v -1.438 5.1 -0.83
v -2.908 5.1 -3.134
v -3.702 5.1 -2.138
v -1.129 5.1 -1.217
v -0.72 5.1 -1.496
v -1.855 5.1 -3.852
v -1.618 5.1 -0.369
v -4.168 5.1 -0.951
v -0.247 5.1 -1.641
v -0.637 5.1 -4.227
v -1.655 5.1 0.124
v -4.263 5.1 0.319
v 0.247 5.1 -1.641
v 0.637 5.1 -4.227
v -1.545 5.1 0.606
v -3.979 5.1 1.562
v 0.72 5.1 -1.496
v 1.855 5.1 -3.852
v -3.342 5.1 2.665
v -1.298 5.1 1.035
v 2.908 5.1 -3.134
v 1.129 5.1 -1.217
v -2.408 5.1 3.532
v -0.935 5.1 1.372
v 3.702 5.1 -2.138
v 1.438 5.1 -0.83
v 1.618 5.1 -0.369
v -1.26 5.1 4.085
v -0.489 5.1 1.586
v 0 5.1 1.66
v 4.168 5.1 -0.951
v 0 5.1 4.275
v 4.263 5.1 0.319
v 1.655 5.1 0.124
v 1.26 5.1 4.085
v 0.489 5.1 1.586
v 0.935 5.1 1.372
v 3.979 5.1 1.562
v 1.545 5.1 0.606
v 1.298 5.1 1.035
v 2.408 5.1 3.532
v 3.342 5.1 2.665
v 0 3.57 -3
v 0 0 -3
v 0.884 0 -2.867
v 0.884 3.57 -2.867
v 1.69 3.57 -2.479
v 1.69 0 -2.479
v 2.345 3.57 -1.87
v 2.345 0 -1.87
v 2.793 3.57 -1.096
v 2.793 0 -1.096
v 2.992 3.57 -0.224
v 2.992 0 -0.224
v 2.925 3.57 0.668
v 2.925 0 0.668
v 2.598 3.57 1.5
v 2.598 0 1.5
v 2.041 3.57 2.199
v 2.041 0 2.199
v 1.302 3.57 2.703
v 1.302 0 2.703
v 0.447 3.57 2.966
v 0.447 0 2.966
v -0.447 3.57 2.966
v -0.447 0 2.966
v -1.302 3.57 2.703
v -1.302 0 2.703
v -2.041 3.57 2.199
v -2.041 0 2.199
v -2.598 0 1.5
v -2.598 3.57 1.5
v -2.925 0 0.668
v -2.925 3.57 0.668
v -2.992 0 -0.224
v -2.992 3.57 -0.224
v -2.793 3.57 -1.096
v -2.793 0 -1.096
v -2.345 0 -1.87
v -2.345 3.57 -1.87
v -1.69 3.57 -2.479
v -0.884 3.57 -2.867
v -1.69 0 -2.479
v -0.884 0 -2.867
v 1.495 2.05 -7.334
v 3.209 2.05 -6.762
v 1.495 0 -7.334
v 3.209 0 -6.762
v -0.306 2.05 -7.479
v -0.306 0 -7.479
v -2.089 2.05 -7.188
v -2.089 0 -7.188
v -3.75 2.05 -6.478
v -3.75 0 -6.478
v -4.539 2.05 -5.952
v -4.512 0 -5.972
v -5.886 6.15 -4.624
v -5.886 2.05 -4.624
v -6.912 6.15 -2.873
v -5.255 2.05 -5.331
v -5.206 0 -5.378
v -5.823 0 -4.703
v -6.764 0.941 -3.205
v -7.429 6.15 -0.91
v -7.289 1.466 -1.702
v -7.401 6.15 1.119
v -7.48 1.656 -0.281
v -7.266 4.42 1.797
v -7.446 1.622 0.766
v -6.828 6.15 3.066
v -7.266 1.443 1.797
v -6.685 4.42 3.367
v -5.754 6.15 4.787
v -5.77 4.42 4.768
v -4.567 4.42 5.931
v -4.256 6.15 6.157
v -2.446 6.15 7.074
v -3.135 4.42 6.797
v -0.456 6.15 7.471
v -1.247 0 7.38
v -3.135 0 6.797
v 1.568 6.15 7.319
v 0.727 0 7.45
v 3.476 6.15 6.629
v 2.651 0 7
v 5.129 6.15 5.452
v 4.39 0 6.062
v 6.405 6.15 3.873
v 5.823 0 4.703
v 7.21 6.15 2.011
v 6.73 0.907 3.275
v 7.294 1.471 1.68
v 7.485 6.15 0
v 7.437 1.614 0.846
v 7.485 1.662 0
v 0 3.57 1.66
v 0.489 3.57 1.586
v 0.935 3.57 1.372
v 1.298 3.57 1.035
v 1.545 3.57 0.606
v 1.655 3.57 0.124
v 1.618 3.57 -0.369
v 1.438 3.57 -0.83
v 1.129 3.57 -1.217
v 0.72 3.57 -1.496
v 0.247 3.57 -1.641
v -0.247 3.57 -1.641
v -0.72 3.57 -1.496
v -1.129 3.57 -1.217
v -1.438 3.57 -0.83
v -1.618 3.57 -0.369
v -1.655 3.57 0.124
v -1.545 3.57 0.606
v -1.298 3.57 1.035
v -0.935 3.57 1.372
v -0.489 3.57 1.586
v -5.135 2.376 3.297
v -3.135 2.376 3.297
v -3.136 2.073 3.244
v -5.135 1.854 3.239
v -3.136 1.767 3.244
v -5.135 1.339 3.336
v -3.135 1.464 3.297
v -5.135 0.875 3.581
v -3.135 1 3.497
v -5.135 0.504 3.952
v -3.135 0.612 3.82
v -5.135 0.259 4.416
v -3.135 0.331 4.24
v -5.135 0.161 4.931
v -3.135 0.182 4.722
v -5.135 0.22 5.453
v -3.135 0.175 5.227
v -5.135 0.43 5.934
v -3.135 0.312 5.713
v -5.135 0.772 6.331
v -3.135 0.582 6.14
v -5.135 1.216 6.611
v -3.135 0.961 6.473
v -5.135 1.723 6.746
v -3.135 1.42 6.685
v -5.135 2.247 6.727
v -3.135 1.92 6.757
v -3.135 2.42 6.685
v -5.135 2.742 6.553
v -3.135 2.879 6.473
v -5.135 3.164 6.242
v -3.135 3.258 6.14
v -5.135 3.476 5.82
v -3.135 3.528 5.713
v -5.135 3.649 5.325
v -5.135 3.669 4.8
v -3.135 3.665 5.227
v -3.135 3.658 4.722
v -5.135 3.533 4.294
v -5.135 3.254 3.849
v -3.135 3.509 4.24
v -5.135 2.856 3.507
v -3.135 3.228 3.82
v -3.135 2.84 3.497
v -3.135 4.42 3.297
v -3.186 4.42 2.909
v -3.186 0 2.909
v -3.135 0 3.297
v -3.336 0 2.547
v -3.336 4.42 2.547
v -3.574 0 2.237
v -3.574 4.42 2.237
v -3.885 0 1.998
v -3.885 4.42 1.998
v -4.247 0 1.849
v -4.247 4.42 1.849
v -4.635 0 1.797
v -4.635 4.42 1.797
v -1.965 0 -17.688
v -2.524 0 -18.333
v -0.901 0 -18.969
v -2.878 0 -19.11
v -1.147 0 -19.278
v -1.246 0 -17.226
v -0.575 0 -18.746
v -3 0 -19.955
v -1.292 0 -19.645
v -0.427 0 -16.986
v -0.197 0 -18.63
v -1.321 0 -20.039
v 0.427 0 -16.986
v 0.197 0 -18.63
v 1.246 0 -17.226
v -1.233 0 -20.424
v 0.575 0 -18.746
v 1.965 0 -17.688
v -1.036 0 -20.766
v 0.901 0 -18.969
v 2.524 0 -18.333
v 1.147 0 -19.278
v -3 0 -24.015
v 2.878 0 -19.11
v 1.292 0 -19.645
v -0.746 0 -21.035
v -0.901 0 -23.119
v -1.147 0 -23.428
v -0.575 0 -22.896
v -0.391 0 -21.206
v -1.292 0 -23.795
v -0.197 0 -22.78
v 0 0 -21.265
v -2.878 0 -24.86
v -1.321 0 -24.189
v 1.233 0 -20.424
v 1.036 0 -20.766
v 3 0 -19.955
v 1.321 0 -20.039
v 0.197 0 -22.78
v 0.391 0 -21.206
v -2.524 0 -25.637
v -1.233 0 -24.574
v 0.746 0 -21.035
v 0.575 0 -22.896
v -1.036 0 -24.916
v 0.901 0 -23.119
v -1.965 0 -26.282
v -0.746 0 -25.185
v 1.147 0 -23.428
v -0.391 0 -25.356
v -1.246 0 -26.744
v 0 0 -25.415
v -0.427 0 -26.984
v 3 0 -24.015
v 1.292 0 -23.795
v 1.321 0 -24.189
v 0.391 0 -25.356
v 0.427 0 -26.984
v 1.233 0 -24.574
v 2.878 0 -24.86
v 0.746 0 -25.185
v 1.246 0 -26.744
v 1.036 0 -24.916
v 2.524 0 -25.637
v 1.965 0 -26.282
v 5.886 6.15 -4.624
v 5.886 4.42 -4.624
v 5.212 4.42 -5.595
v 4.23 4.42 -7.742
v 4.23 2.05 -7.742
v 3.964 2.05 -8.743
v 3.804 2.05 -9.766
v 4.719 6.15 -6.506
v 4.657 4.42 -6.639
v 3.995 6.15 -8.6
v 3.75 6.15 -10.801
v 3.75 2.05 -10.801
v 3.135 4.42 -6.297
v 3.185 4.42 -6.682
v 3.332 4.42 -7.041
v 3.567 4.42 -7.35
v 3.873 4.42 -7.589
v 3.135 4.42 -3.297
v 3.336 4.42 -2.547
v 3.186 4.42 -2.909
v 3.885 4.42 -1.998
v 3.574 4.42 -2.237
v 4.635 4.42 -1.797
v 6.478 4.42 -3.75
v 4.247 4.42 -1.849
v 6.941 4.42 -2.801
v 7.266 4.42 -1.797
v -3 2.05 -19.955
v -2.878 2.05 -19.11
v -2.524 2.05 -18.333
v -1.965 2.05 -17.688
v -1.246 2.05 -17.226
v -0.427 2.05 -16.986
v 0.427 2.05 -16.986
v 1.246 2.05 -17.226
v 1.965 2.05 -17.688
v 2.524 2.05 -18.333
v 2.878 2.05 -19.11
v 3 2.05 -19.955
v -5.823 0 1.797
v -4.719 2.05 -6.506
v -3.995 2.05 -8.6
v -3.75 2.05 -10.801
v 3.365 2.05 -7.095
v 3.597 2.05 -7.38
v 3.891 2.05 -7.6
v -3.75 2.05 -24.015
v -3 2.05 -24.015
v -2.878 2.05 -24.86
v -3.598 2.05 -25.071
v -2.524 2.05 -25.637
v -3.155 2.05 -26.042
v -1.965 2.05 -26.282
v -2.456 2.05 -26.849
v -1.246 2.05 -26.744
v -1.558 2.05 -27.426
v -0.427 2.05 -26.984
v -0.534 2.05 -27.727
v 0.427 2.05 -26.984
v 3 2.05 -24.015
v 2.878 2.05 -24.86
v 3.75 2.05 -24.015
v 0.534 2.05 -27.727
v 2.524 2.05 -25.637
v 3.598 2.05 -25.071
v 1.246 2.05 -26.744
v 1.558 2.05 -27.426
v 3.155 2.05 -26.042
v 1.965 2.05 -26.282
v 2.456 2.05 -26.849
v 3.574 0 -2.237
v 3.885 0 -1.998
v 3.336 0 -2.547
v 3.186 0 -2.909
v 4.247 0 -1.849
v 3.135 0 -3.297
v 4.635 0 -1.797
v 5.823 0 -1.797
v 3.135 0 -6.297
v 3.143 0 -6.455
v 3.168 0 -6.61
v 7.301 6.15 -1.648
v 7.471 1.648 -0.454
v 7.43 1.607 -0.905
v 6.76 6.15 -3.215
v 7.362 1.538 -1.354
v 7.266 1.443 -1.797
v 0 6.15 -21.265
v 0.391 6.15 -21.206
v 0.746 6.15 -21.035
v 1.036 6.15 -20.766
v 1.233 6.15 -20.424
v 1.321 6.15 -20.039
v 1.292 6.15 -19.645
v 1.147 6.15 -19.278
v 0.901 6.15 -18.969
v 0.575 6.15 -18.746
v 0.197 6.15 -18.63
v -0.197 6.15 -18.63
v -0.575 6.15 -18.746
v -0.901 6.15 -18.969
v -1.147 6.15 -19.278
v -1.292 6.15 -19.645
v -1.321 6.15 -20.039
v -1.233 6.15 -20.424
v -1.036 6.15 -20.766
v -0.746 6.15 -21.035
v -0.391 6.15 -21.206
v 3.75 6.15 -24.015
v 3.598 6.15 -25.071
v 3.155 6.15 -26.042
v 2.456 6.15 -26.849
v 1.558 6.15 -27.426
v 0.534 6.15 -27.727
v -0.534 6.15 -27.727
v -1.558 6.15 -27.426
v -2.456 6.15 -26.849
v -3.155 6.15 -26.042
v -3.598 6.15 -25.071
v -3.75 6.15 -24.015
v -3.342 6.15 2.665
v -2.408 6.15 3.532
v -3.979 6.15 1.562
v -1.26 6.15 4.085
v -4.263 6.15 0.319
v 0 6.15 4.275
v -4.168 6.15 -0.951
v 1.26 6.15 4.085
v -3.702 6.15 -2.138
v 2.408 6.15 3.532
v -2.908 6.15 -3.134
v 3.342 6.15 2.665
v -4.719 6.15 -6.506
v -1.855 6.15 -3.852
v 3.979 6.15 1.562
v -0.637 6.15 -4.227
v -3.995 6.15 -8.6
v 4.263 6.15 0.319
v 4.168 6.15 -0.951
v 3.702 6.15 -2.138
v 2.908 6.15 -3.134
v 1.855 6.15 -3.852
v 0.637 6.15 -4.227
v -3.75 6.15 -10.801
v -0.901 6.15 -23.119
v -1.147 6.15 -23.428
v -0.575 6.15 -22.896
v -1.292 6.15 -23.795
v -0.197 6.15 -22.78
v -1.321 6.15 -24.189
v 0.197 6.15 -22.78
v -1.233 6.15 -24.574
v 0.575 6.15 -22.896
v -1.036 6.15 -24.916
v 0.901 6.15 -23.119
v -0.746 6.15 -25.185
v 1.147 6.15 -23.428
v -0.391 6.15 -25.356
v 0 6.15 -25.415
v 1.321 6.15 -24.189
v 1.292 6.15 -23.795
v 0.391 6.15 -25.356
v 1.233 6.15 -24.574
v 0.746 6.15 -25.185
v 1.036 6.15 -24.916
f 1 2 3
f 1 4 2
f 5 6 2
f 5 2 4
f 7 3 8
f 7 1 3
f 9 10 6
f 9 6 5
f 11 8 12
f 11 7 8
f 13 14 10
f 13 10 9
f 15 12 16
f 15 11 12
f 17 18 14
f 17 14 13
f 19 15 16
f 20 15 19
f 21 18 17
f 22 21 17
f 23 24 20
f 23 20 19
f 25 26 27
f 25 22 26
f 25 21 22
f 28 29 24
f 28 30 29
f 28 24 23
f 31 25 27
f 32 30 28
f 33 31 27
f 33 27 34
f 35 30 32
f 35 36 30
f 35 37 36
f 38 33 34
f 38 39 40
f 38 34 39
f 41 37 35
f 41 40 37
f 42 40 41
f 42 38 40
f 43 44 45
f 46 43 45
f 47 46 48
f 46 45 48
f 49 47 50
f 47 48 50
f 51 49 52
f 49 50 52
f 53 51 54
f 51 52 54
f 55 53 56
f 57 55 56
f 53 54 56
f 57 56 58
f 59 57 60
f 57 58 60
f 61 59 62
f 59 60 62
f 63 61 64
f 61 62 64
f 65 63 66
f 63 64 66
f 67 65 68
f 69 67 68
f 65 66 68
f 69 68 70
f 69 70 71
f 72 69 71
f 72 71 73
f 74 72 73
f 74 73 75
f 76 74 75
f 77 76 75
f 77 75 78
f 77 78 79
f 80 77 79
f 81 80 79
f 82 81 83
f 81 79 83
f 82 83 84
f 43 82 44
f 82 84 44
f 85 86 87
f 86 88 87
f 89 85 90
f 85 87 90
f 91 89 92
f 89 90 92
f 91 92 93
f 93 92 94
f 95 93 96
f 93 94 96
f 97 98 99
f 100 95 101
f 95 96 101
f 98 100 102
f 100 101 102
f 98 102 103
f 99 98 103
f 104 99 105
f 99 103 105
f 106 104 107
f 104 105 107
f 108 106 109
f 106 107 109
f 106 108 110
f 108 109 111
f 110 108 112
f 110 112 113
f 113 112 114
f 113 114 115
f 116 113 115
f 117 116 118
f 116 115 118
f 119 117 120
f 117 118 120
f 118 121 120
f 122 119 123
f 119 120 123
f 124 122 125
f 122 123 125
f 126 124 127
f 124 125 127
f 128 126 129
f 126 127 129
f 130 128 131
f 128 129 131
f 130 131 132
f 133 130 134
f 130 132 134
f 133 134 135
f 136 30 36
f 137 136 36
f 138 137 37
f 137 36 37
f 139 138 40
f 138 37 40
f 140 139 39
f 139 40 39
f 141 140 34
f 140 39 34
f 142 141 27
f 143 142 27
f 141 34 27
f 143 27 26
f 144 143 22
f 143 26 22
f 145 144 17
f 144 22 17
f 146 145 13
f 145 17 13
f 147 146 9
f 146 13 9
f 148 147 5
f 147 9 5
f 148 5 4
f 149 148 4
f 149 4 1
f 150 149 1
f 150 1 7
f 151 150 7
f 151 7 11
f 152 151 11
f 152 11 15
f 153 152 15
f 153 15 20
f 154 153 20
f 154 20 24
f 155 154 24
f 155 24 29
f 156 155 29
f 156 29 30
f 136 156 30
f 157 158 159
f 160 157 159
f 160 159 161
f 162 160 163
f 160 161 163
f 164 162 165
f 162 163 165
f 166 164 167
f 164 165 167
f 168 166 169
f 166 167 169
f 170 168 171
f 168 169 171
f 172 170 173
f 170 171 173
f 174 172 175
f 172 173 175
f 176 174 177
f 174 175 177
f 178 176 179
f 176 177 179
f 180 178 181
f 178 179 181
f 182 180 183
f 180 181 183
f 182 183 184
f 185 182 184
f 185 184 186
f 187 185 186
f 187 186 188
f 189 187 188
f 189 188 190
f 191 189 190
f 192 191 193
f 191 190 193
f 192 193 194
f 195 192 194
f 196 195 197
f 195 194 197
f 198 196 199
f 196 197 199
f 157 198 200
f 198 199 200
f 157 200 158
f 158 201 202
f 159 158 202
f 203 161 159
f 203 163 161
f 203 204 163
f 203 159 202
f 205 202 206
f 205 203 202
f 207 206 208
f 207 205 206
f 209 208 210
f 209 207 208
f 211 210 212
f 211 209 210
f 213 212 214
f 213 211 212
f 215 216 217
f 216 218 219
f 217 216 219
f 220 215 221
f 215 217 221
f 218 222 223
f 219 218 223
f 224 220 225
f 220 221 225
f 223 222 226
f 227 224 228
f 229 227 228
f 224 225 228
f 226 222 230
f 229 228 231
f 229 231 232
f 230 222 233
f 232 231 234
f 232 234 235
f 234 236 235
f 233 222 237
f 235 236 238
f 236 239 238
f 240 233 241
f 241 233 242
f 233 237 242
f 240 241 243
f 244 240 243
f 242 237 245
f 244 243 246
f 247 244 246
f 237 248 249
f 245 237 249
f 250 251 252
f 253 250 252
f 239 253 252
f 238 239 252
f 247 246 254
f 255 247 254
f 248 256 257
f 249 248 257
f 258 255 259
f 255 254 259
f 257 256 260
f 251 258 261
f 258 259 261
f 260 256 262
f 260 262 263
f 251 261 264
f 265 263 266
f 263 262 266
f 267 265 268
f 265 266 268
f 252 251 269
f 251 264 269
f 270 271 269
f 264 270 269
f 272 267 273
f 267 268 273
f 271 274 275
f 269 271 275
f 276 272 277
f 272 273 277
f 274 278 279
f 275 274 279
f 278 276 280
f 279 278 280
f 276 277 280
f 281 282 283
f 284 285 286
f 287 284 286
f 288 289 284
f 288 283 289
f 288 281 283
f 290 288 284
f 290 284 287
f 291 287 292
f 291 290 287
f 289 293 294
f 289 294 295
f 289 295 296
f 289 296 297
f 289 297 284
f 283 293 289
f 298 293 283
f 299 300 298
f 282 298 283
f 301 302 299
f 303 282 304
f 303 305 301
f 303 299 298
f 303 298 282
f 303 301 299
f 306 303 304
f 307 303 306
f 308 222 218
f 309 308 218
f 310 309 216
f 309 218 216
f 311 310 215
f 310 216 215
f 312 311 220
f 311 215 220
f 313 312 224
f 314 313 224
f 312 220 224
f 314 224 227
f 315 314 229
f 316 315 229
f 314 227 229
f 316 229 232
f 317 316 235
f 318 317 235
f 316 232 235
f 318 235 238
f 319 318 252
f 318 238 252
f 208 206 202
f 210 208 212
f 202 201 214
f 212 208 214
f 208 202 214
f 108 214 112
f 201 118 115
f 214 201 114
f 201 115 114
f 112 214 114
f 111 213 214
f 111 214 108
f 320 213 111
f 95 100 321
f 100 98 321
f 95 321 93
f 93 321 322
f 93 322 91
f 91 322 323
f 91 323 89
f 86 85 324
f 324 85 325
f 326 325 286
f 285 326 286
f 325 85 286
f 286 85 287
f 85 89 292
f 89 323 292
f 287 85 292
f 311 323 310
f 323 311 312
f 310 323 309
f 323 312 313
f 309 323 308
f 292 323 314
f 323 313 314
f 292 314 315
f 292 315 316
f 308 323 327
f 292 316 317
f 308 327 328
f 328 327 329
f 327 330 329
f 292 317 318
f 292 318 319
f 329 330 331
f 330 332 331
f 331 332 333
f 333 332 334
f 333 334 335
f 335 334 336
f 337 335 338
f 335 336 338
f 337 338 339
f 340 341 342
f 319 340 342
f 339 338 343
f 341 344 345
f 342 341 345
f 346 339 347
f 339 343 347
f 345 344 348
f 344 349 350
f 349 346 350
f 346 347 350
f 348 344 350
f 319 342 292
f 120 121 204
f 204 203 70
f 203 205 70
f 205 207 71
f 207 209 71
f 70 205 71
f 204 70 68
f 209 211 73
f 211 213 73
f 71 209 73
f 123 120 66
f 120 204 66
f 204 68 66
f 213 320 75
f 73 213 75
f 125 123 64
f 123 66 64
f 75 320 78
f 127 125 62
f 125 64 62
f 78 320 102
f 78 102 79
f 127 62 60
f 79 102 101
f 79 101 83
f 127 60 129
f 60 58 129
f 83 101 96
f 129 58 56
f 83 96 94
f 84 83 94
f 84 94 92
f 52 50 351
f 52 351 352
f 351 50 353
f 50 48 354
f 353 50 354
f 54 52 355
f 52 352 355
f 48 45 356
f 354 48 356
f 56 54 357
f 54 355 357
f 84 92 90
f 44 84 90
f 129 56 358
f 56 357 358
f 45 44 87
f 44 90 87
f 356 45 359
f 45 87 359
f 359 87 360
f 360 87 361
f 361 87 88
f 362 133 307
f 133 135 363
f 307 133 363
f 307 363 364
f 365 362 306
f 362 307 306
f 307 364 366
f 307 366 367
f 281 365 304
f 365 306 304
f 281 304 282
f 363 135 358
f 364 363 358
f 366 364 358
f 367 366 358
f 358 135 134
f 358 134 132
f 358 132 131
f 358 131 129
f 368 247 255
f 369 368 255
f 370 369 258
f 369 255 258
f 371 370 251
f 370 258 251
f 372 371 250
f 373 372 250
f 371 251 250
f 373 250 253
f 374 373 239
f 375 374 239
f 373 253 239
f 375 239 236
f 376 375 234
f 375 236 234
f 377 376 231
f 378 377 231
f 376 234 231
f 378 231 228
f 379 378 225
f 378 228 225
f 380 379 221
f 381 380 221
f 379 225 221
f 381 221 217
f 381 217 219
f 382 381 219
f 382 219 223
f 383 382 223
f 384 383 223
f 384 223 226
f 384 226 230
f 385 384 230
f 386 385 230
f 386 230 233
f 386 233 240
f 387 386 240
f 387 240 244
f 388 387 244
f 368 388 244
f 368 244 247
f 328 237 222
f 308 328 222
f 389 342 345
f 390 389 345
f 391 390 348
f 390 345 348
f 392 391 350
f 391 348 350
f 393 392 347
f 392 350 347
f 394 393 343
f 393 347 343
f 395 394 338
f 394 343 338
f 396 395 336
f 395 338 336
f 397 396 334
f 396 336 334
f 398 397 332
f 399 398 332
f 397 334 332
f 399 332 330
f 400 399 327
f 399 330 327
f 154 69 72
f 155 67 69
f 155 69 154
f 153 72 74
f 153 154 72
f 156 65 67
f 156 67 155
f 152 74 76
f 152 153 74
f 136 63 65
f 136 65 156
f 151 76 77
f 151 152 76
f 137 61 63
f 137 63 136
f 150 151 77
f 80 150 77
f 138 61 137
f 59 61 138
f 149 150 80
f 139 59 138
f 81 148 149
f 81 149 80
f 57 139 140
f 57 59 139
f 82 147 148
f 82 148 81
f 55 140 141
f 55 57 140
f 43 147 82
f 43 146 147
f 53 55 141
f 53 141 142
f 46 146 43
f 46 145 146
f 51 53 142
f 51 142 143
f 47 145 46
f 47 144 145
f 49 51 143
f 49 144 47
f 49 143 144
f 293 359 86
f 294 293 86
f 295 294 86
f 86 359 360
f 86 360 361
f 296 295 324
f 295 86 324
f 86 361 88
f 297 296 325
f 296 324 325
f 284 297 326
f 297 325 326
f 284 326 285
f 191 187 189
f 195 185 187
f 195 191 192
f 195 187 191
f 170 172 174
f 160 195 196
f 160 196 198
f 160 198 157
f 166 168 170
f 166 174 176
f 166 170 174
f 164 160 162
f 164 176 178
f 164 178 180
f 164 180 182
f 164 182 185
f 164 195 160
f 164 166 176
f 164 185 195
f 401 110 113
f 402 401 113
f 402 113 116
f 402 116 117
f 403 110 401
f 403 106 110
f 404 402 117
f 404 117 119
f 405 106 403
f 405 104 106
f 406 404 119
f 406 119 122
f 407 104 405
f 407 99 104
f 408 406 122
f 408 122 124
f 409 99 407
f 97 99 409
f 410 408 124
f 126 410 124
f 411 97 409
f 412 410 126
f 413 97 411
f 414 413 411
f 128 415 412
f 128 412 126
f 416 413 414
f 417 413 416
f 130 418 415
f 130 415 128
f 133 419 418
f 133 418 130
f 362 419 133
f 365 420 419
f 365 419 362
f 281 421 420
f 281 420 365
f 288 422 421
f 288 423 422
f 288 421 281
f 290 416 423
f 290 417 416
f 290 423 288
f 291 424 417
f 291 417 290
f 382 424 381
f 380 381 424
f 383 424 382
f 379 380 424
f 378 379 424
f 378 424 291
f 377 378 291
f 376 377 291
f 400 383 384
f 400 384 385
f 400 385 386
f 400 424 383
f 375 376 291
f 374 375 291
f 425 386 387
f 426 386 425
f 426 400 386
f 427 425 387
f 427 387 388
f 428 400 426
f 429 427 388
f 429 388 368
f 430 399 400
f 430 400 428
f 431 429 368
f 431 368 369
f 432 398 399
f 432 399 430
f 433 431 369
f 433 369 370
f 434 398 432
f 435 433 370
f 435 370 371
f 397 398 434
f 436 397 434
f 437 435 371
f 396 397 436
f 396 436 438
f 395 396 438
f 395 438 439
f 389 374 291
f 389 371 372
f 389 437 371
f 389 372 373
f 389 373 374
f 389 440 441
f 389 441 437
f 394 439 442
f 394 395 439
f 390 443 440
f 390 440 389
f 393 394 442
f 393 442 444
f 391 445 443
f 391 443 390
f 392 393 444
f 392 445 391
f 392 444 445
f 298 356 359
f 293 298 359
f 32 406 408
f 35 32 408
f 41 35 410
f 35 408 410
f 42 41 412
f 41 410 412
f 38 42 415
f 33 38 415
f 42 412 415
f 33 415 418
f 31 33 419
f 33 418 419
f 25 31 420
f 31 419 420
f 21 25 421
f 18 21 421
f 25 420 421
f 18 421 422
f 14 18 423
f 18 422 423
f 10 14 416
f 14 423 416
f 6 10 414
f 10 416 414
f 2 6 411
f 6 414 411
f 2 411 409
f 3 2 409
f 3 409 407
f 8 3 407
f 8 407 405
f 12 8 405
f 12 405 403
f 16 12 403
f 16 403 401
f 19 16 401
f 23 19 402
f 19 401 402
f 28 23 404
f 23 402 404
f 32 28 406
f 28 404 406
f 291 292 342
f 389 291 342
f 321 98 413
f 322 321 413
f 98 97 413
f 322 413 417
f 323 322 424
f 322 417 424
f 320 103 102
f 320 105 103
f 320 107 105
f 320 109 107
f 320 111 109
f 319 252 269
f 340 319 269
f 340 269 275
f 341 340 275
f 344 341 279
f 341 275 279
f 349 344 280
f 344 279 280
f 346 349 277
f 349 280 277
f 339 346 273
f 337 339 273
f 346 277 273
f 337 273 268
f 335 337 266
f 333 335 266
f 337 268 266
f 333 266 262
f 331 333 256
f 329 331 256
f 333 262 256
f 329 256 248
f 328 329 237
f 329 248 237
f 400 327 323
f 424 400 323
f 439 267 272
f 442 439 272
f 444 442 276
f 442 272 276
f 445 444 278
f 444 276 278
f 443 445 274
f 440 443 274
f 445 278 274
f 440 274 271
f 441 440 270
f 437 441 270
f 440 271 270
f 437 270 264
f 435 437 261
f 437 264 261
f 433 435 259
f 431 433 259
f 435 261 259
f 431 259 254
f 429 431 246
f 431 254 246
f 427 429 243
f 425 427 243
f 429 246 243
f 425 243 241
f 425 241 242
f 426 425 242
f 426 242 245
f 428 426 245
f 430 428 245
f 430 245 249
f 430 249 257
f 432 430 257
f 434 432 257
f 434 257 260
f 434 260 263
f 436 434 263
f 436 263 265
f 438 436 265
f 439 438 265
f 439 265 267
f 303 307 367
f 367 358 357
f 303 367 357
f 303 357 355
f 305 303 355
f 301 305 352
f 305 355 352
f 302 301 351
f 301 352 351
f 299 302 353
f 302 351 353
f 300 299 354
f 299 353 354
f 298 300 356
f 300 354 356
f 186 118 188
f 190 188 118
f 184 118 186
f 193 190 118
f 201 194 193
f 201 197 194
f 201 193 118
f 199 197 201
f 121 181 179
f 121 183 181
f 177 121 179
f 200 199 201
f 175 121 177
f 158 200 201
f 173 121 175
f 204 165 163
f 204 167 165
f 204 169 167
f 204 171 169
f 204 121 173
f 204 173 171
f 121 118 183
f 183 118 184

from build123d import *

# Parameters (mm, degrees)
BOSS_EXTRUDE1_DEPTH = 2.05
BOSS_EXTRUDE2_START = 2.05
BOSS_EXTRUDE2_DEPTH = 4.1
FILLET1_R           = 10
SKETCH2_R           = 1.66
CUT_EXTRUDE1_DEPTH  = 30.406512034
SKETCH2_3_R         = 4.275
SKETCH2_3_R_2       = 1.66
CUT_EXTRUDE2_DEPTH  = 1.05
SKETCH3_R           = 1.325
CUT_EXTRUDE3_DEPTH  = 30.406512034
CUT_EXTRUDE4_DEPTH  = 30.406512034
CUT_EXTRUDE5_DEPTH  = 4.42
SKETCH6_R           = 3
CUT_EXTRUDE6_DEPTH  = 3.57
SKETCH7_R           = 1.76
BOSS_EXTRUDE3_DEPTH = 2


with BuildPart() as part:
    # Sketch1 → Boss-Extrude1 (new body)
    with BuildSketch(Plane(origin=(0, 0, 0), x_dir=(1, 0, 0), z_dir=(0, 1, 0))):
        with BuildLine():
            ThreePointArc((7.485, 0), (6.484364849, 3.738748119), (3.75, 6.477864231))
            Line((3.75, 6.477864231), (3.75, 0))
            ThreePointArc((3.75, 0), (0, -3.75), (-3.75, 0))
            Line((-3.75, 0), (-3.75, 6.477864231))
            ThreePointArc((-3.75, 6.477864231), (-3.738748119, -6.484364849), (7.485, 0))
        make_face()
        with BuildLine():
            Line((3.75, 0), (3.75, 6.477864231))
            ThreePointArc((3.75, 6.477864231), (0, 7.485), (-3.75, 6.477864231))
            Line((-3.75, 6.477864231), (-3.75, 0))
            ThreePointArc((-3.75, 0), (0, -3.75), (3.75, 0))
        make_face()
        with BuildLine():
            Line((-3, 24.015), (-3, 19.955))
            ThreePointArc((-3, 19.955), (0, 16.955), (3, 19.955))
            Line((3, 19.955), (3, 24.015))
            ThreePointArc((3, 24.015), (0, 27.015), (-3, 24.015))
        make_face()
    extrude(amount=BOSS_EXTRUDE1_DEPTH)

    # Sketch1<3> → Boss-Extrude2 (add)
    # profile 1 of 6: a face of its own
    with BuildSketch(Plane(origin=(0, 0, 0), x_dir=(1, 0, 0), z_dir=(0, 1, 0)).offset(BOSS_EXTRUDE2_START)):
        with BuildLine():
            ThreePointArc((7.485, 0), (6.484364849, 3.738748119), (3.75, 6.477864231))
            Line((3.75, 6.477864231), (3.75, 0))
            ThreePointArc((3.75, 0), (0, -3.75), (-3.75, 0))
            Line((-3.75, 0), (-3.75, 6.477864231))
            ThreePointArc((-3.75, 6.477864231), (-3.738748119, -6.484364849), (7.485, 0))
        make_face()
    # profile 2 of 6: a face of its own
    with BuildSketch(Plane(origin=(0, 0, 0), x_dir=(1, 0, 0), z_dir=(0, 1, 0)).offset(BOSS_EXTRUDE2_START)):
        with BuildLine():
            Line((3.75, 0), (3.75, 6.477864231))
            ThreePointArc((3.75, 6.477864231), (0, 7.485), (-3.75, 6.477864231))
            Line((-3.75, 6.477864231), (-3.75, 0))
            ThreePointArc((-3.75, 0), (0, -3.75), (3.75, 0))
        make_face()
    # profile 3 of 6: a face of its own
    with BuildSketch(Plane(origin=(0, 0, 0), x_dir=(1, 0, 0), z_dir=(0, 1, 0)).offset(BOSS_EXTRUDE2_START)):
        with BuildLine():
            ThreePointArc((7.485, 0), (6.484364849, 3.738748119), (3.75, 6.477864231))
            Line((3.75, 6.477864231), (3.75, 0))
            ThreePointArc((3.75, 0), (0, -3.75), (-3.75, 0))
            Line((-3.75, 0), (-3.75, 6.477864231))
            ThreePointArc((-3.75, 6.477864231), (-3.738748119, -6.484364849), (7.485, 0))
        make_face()
    # profile 4 of 6: a face of its own
    with BuildSketch(Plane(origin=(0, 0, 0), x_dir=(1, 0, 0), z_dir=(0, 1, 0)).offset(BOSS_EXTRUDE2_START)):
        with BuildLine():
            Line((3.75, 0), (3.75, 6.477864231))
            ThreePointArc((3.75, 6.477864231), (0, 7.485), (-3.75, 6.477864231))
            Line((-3.75, 6.477864231), (-3.75, 0))
            ThreePointArc((-3.75, 0), (0, -3.75), (3.75, 0))
        make_face()
    # profile 5 of 6: a face of its own
    with BuildSketch(Plane(origin=(0, 0, 0), x_dir=(1, 0, 0), z_dir=(0, 1, 0)).offset(BOSS_EXTRUDE2_START)):
        with BuildLine():
            Line((3.75, 6.477864231), (3.75, 24.015))
            ThreePointArc((3.75, 24.015), (0, 27.765), (-3.75, 24.015))
            Line((-3.75, 24.015), (-3.75, 6.477864231))
            ThreePointArc((-3.75, 6.477864231), (0, 7.485), (3.75, 6.477864231))
        make_face()
        with BuildLine():
            ThreePointArc((-3, 24.015), (0, 27.015), (3, 24.015))
            Line((3, 24.015), (3, 19.955))
            ThreePointArc((3, 19.955), (0, 16.955), (-3, 19.955))
            Line((-3, 19.955), (-3, 24.015))
        make_face(mode=Mode.SUBTRACT)
    # profile 6 of 6: a face of its own
    with BuildSketch(Plane(origin=(0, 0, 0), x_dir=(1, 0, 0), z_dir=(0, 1, 0)).offset(BOSS_EXTRUDE2_START)):
        with BuildLine():
            Line((-3, 24.015), (-3, 19.955))
            ThreePointArc((-3, 19.955), (0, 16.955), (3, 19.955))
            Line((3, 19.955), (3, 24.015))
            ThreePointArc((3, 24.015), (0, 27.015), (-3, 24.015))
        make_face()
    extrude(amount=BOSS_EXTRUDE2_DEPTH)

    # Fillet1
    fillet1_edges = [part.edges().sort_by_distance(p)[0] for p in [
        (-3.75, 4.1, -6.477864231),
        (3.75, 4.1, -6.477864231),
    ]]
    fillet(fillet1_edges, radius=FILLET1_R)

    # Sketch2 → Cut-Extrude1 (cut, through all)
    with BuildSketch(Plane(origin=(0, 6.15, 0), x_dir=(1, 0, 0), z_dir=(0, 1, 0))):
        with Locations(Location((0, 0, 0), (0, 0, 270))):
            Circle(SKETCH2_R)
    extrude(amount=-CUT_EXTRUDE1_DEPTH, mode=Mode.SUBTRACT)

    # Sketch2<3> → Cut-Extrude2 (cut)
    with BuildSketch(Plane(origin=(0, 6.15, 0), x_dir=(1, 0, 0), z_dir=(0, 1, 0))):
        with Locations(Location((0, 0, 0), (0, 0, 270))):
            Circle(SKETCH2_3_R)
        with Locations(Location((0, 0, 0), (0, 0, 270))):
            Circle(SKETCH2_3_R_2, mode=Mode.SUBTRACT)
    extrude(amount=-CUT_EXTRUDE2_DEPTH, mode=Mode.SUBTRACT)

    # Sketch3 → Cut-Extrude3 (cut, through all)
    with BuildSketch(Plane(origin=(0, 0, 0), x_dir=(-1, 0, 0), z_dir=(0, -1, 0))):
        with Locations(Location((0, 19.94, 0), (0, 0, 90))):
            Circle(SKETCH3_R)
        with Locations(Location((0, 24.09, 0), (0, 0, 90))):
            Circle(SKETCH3_R)
    extrude(amount=-CUT_EXTRUDE3_DEPTH, mode=Mode.SUBTRACT)

    # Sketch4 → Cut-Extrude4 (cut, symmetric)
    with BuildSketch(Plane.XY):
        Polygon((-23.349611589, -29.172910653), (5.823299064, 0), (7.485, 1.661700936), (36.657910653, 30.834611589), (95.003731959, -27.511209717), (34.996209717, -87.518731959), align=None)
    cut_extrude4 = extrude(amount=CUT_EXTRUDE4_DEPTH, both=True, mode=Mode.SUBTRACT)

    # Mirror1: Cut-Extrude4 across plane
    add(cut_extrude4.mirror(Plane(origin=(0, 0, 0), x_dir=(0, 0, 1), z_dir=(1, 0, 0))), mode=Mode.SUBTRACT)

    # Sketch5 → Cut-Extrude5 (cut)
    with BuildSketch(Plane.XZ):
        with BuildLine():
            Line((21.72046725, -1.797403589), (4.635, -1.797403589))
            ThreePointArc((4.635, -1.797403589), (3.574339828, -2.236743417), (3.135, -3.297403589))
            Line((3.135, -3.297403589), (3.135, -6.297403589))
            ThreePointArc((3.135, -6.297403589), (3.574339828, -7.35806376), (4.635, -7.797403589))
            Line((4.635, -7.797403589), (21.72046725, -7.797403589))
            Line((21.72046725, -7.797403589), (21.72046725, -1.797403589))
        make_face()
        with BuildLine():
            Line((-4.635, 1.797403589), (-13.906337827, 1.797403589))
            Line((-13.906337827, 1.797403589), (-13.906337827, 10.507844077))
            Line((-13.906337827, 10.507844077), (-3.135, 10.507844077))
            Line((-3.135, 10.507844077), (-3.135, 3.297403589))
            ThreePointArc((-3.135, 3.297403589), (-3.574339828, 2.236743417), (-4.635, 1.797403589))
        make_face()
    extrude(amount=-CUT_EXTRUDE5_DEPTH, mode=Mode.SUBTRACT)

    # Sketch6 → Cut-Extrude6 (cut)
    with BuildSketch(Plane.XZ):
        with Locations(Location((0, 0, 0), (0, 0, 270))):
            Circle(SKETCH6_R)
    extrude(amount=-CUT_EXTRUDE6_DEPTH, mode=Mode.SUBTRACT)

    # Sketch7 → Boss-Extrude3 (add)
    with BuildSketch(Plane.ZY.offset(3.135)):
        with Locations(Location((4.997403589, 1.92, 0), (0, 0, 164.996295671))):
            Circle(SKETCH7_R)
    extrude(amount=BOSS_EXTRUDE3_DEPTH)


solid = part.part
